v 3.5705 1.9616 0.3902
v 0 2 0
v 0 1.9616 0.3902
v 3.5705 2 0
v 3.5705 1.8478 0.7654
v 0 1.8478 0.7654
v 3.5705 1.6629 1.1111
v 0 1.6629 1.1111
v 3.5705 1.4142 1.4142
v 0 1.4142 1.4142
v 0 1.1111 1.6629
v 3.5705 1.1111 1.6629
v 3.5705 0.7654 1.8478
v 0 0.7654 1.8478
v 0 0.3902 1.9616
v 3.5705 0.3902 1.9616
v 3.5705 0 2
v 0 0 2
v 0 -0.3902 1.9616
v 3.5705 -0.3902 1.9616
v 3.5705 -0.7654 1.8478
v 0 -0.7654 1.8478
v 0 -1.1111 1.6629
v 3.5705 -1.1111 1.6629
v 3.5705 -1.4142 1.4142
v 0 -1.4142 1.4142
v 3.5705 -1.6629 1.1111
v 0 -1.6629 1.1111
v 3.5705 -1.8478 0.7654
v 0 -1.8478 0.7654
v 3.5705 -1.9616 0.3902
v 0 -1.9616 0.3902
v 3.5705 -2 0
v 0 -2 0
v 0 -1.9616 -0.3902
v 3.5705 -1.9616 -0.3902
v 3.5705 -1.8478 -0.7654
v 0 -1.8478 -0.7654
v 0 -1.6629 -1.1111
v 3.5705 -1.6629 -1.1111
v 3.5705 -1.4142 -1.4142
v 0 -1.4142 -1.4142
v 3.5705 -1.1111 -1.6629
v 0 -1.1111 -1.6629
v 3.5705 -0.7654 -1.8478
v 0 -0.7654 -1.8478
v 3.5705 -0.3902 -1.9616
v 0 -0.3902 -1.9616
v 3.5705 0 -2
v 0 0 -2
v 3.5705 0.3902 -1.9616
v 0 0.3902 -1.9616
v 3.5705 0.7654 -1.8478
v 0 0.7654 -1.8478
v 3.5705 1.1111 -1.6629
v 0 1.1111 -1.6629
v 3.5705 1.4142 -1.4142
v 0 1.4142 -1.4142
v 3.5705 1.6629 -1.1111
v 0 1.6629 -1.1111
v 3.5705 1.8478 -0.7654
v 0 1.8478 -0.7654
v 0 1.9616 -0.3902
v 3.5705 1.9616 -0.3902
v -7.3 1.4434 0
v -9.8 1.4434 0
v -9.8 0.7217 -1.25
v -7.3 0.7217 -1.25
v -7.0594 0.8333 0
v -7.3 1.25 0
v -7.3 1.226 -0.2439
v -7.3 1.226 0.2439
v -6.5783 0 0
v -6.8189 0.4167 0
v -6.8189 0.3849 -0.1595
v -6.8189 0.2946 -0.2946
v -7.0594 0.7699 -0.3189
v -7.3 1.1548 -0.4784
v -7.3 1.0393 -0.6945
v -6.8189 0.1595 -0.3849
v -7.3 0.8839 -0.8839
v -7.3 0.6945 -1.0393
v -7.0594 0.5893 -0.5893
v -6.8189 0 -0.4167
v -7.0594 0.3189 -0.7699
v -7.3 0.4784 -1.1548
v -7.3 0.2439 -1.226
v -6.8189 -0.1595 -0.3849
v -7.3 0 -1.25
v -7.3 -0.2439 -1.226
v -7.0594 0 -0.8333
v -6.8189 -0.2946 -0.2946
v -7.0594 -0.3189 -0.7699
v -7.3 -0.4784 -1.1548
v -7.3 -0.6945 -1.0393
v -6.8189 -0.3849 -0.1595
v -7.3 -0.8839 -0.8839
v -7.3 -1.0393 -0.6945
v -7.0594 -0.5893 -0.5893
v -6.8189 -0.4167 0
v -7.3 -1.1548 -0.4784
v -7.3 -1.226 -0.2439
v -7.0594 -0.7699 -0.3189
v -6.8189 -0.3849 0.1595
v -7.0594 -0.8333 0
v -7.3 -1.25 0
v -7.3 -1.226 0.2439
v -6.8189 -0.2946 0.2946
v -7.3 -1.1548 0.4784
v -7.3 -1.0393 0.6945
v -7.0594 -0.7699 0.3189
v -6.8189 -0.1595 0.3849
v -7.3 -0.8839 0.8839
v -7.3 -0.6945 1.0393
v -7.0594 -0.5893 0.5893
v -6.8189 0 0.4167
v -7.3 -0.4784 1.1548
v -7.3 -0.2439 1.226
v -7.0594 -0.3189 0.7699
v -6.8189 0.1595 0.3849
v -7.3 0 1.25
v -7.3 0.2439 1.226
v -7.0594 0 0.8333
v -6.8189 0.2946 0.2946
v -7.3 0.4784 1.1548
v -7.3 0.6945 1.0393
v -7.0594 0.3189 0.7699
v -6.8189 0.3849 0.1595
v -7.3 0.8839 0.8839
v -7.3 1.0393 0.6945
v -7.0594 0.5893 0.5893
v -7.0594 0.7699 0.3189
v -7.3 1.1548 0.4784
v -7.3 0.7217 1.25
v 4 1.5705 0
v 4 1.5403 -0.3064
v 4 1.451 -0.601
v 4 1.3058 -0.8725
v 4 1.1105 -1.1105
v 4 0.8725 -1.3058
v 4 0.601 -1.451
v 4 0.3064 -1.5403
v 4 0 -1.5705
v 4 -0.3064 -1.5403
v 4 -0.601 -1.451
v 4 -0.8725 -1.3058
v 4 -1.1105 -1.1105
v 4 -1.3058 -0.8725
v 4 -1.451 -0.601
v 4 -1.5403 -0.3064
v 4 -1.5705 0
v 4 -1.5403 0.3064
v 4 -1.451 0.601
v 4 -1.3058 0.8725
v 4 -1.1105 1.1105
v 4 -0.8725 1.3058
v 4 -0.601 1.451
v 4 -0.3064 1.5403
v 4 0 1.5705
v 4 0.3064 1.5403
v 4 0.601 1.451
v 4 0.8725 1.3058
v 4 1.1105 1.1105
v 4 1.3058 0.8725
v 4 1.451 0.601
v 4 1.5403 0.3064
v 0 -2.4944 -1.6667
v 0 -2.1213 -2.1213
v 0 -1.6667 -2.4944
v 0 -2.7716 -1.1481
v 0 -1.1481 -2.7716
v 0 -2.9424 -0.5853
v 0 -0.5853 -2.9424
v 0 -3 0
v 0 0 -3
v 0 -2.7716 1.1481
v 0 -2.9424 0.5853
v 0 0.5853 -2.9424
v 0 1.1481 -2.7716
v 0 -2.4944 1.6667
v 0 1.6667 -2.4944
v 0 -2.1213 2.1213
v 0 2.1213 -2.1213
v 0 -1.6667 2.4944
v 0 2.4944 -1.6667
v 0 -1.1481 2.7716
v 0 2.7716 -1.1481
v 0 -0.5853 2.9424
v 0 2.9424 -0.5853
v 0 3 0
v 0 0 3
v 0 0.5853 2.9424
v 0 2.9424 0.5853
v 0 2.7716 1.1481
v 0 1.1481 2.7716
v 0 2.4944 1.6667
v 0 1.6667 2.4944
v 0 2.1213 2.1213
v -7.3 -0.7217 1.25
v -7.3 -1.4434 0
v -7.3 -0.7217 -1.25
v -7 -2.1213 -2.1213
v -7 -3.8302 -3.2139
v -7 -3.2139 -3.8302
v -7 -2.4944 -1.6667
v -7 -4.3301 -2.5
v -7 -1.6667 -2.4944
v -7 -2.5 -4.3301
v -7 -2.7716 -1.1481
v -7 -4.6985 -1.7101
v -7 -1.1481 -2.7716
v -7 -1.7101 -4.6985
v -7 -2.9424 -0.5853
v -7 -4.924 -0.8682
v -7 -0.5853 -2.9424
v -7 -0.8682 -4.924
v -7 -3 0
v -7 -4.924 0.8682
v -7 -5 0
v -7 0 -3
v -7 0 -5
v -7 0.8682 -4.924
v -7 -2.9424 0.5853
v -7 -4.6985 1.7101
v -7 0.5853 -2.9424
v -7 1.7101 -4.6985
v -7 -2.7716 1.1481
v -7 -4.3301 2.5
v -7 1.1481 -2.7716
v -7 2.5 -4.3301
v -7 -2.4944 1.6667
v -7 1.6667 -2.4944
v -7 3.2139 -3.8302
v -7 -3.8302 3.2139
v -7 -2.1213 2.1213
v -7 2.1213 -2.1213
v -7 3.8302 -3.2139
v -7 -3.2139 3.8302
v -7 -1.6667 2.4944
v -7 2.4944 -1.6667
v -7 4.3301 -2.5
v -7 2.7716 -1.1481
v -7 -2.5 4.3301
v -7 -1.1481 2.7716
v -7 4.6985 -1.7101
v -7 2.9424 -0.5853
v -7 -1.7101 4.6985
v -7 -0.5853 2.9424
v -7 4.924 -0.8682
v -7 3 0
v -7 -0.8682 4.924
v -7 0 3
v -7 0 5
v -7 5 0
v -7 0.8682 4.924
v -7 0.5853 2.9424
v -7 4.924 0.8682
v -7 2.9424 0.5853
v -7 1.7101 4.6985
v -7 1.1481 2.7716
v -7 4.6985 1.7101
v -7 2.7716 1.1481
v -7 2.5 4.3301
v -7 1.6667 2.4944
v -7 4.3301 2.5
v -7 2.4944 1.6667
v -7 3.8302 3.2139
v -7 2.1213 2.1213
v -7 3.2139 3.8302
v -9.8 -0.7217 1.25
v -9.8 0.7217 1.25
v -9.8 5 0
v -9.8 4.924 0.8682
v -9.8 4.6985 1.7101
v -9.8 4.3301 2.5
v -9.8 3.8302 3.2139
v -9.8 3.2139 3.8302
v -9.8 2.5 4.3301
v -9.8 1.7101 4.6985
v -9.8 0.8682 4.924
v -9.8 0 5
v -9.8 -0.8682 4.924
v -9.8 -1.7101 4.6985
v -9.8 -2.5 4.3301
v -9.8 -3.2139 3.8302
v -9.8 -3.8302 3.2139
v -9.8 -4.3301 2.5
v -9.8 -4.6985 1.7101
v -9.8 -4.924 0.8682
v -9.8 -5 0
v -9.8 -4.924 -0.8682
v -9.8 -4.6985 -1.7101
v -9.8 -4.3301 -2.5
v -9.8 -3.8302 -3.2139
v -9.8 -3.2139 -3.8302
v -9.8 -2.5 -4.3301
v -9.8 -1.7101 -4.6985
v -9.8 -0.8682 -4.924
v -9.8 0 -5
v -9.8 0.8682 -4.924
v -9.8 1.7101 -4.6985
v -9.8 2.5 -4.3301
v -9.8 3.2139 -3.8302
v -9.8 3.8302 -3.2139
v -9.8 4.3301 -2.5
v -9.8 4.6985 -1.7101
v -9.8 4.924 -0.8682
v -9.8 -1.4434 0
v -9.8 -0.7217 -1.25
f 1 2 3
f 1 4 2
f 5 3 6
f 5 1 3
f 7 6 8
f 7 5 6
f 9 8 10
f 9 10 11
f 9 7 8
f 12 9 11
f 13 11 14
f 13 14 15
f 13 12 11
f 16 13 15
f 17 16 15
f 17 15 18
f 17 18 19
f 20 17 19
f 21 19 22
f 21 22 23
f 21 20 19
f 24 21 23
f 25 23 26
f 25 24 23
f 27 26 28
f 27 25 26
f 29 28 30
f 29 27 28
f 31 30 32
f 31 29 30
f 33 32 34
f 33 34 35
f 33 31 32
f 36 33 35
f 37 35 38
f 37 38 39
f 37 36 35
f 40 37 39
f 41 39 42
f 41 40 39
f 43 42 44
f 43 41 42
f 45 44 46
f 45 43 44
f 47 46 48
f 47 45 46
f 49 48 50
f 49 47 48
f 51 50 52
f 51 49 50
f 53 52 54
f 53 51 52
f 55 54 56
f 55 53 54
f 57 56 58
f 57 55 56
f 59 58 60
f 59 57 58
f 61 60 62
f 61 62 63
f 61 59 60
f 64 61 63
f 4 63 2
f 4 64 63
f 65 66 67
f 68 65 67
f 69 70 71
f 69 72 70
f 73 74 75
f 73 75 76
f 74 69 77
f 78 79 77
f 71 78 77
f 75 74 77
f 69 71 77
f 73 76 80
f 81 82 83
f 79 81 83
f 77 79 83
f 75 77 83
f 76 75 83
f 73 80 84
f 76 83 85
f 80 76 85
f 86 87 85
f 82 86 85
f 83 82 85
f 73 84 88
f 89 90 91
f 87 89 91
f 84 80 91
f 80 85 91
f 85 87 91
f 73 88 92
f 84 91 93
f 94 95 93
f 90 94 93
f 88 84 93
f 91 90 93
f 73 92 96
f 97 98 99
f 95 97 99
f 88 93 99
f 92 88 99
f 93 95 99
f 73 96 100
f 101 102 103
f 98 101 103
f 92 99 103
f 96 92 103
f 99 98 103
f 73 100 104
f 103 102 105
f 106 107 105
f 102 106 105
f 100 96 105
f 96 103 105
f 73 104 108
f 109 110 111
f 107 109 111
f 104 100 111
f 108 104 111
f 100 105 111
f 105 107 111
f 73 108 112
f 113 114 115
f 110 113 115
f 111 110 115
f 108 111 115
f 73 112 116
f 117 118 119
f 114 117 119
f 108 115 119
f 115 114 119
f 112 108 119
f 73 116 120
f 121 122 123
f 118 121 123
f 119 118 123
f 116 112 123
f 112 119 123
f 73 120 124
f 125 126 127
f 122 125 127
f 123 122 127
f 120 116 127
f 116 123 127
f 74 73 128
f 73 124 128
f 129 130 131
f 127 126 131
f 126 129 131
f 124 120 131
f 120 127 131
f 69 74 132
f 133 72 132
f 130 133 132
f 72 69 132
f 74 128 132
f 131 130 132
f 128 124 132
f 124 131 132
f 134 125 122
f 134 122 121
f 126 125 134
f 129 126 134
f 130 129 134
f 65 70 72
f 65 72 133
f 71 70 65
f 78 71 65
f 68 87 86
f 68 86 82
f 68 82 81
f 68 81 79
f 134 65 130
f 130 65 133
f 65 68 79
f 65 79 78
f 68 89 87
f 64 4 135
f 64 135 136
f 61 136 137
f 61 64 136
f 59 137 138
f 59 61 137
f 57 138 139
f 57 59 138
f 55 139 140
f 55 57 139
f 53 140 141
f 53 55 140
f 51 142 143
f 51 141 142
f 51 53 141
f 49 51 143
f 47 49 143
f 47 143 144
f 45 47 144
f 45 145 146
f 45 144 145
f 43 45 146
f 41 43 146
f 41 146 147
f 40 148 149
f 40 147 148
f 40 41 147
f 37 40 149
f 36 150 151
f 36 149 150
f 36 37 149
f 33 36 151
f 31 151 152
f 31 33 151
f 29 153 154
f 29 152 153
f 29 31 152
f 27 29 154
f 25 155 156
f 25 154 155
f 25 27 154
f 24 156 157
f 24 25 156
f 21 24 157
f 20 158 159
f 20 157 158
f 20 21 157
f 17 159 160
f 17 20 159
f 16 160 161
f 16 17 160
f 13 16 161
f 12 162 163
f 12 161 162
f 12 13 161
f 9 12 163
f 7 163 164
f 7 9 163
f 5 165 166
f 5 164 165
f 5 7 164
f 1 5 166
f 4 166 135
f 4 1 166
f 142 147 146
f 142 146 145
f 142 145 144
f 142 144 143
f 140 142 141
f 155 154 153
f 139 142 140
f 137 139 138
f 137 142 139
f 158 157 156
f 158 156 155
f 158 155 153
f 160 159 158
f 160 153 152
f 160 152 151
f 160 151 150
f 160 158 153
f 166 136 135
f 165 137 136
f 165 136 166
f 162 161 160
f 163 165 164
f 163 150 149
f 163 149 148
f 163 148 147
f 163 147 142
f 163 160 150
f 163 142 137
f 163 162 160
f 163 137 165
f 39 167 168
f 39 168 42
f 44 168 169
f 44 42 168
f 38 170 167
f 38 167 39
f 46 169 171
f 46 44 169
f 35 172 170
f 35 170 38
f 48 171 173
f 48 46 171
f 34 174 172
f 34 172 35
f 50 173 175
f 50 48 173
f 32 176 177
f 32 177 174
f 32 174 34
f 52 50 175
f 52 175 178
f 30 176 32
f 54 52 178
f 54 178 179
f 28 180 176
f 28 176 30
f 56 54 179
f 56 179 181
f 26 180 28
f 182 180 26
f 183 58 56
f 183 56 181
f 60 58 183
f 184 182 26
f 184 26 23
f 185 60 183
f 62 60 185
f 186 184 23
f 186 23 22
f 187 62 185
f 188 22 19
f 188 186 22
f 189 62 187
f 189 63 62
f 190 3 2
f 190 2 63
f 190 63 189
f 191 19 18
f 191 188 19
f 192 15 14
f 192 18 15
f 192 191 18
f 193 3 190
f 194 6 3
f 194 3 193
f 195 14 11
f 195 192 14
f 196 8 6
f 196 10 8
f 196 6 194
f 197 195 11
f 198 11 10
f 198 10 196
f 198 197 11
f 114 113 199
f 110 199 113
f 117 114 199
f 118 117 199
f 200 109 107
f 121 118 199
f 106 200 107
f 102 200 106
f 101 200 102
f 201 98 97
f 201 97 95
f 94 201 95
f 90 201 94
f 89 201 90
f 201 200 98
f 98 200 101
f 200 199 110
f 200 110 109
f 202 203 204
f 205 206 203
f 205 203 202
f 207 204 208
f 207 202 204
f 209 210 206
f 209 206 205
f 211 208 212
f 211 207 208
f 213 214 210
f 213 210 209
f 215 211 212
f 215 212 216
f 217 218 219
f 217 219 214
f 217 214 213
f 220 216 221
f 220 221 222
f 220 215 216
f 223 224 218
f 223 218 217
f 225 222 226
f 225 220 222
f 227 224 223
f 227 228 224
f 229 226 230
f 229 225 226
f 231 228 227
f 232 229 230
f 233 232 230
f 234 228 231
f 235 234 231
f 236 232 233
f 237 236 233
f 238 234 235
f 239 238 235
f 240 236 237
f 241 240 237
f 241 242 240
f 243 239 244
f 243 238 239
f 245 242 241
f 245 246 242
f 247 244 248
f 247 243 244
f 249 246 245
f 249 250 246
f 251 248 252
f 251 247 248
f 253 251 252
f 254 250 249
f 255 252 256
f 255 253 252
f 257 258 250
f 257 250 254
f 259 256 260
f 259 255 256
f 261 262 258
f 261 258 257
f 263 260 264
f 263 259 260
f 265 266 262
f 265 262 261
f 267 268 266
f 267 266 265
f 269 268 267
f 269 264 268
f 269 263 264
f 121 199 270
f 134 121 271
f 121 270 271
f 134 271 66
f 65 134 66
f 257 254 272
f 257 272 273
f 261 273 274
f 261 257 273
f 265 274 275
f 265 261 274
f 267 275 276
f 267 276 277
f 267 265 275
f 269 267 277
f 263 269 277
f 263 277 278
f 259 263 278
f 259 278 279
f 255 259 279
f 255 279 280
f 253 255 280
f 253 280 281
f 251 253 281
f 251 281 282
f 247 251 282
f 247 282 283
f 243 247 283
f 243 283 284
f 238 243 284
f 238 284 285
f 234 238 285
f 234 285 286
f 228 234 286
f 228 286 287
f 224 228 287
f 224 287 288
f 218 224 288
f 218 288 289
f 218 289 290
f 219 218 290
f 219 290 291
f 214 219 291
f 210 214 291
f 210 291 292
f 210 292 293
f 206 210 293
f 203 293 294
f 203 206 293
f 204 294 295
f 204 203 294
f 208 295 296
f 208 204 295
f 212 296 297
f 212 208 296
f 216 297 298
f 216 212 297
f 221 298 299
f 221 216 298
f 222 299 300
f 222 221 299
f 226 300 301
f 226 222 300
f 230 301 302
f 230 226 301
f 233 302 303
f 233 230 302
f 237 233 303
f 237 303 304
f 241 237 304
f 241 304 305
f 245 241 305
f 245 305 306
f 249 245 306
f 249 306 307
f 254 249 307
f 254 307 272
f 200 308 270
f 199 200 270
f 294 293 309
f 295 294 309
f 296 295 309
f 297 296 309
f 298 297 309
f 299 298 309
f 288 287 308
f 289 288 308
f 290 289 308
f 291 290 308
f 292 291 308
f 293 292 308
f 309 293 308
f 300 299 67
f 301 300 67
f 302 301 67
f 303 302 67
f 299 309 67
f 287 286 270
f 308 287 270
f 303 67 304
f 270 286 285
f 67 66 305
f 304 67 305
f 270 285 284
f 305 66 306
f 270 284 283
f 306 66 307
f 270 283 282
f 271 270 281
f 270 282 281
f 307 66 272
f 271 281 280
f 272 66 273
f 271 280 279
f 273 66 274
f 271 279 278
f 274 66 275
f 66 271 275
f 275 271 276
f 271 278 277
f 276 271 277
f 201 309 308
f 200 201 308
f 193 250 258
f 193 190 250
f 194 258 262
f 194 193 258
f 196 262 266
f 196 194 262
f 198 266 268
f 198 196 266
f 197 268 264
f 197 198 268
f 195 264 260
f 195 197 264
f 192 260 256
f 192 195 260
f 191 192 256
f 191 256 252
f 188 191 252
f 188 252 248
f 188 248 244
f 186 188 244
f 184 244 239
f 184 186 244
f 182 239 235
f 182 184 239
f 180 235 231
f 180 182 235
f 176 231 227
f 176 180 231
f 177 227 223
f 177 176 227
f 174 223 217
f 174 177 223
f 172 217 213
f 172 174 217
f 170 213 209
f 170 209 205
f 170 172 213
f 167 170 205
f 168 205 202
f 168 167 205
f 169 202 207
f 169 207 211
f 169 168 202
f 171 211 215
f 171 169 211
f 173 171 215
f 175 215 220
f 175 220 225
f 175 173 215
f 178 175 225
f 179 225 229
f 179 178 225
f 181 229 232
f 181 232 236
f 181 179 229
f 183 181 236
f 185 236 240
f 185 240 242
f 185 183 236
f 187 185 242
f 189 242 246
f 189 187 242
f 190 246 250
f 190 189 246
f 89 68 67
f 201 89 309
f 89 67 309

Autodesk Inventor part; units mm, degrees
ref_plane "YZ Plane" through (0, 0, 0) normal (1, 0, 0) x (0, 1, 0)
ref_plane "XZ Plane" through (0, 0, 0) normal (0, 1, 0) x (-1, 0, 0)
ref_plane "XY Plane" through (0, 0, 0) normal (0, 0, 1) x (1, 0, 0)
sketch "Sketch_1" plane through (0, 0, 0) normal (0, 0, 1) x (1, 0, 0)
  line L0 (4, 0) -> (-9.8, 0)
  line L1 (-9.8, 0) -> (-9.8, 5)
  line L2 (-9.8, 5) -> (-7, 5)
  line L3 (-7, 5) -> (-7, 3)
  line L4 (-7, 3) -> (0, 3)
  line L5 (0, 3) -> (0, 2)
  line L6 (0, 2) -> (3.5705, 2)
  line L7 (3.5705, 2) -> (4, 1.5705)
  line L8 (4, 1.5705) -> (4, 0)
  line L9 (4, 0) -> (-9.8, 0)
revolve "Revolution1" add sketch "Sketch_1" angle 360 about axis through (4, 0, 0) along (1, 0, 0)
thread "Thread1" size "M4x0.7" class "6g" standard "ISO Metric profile" length 2.3705
sketch "Sketch_2" plane through (-9.8, 0, 0) normal (-1, 0, 0) x (0, 1, 0)
  line L0 (-1.4434, 0) -> (-0.7217, -1.25)
  line L1 (-0.7217, -1.25) -> (0.7217, -1.25)
  line L2 (0.7217, -1.25) -> (1.4434, 0)
  line L3 (1.4434, 0) -> (0.7217, 1.25)
  line L4 (0.7217, 1.25) -> (-0.7217, 1.25)
  line L5 (-0.7217, 1.25) -> (-1.4434, 0)
extrude "Extrusion1" cut sketch "Sketch_2" against normal blind 2.5
sketch "Sketch_3" plane through (0, 0, 0) normal (0, 0, 1) x (1, 0, 0)
  line L0 (-6.5783, 0) -> (-7.3, 0)
  line L1 (-7.3, 0) -> (-7.3, 1.25)
  line L2 (-7.3, 1.25) -> (-6.5783, 0)
  line L3 (-6.5783, 0) -> (-7.3, 0)
revolve "Revolution2" cut sketch "Sketch_3" angle 360 about axis through (-6.5783, 0, 0) along (1, 0, 0)
properties part number "DBS4-7-4"
